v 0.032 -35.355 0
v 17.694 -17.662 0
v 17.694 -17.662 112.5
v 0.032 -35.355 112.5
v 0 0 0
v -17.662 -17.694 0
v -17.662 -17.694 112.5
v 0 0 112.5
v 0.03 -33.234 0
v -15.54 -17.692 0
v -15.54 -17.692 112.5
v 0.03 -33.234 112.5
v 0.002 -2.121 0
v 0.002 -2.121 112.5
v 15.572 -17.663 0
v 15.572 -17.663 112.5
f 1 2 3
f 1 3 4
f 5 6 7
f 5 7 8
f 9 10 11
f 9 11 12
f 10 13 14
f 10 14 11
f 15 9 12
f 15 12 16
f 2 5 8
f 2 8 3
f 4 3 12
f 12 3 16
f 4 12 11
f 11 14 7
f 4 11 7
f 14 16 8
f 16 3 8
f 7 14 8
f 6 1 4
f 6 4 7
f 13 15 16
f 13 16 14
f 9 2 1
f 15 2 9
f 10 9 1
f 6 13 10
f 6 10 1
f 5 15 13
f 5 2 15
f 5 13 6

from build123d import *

# Parameters (mm, degrees)
EXTRUDE_1_DEPTH = 112.5


with BuildPart() as part:
    # 草圖1 → 填料-伸長1 (new body)
    with BuildSketch(Plane.XY):
        Polygon((0, 0), (17.69379362, -17.661530719), (0.032262901, -35.355324339), (-17.661530719, -17.69379362), align=None)
        Polygon((0.001935774, -2.12131946), (-15.540211259, -17.691857846), (0.030327127, -33.234004879), (15.57247416, -17.663466493), align=None, mode=Mode.SUBTRACT)
    extrude(amount=EXTRUDE_1_DEPTH)


solid = part.part
